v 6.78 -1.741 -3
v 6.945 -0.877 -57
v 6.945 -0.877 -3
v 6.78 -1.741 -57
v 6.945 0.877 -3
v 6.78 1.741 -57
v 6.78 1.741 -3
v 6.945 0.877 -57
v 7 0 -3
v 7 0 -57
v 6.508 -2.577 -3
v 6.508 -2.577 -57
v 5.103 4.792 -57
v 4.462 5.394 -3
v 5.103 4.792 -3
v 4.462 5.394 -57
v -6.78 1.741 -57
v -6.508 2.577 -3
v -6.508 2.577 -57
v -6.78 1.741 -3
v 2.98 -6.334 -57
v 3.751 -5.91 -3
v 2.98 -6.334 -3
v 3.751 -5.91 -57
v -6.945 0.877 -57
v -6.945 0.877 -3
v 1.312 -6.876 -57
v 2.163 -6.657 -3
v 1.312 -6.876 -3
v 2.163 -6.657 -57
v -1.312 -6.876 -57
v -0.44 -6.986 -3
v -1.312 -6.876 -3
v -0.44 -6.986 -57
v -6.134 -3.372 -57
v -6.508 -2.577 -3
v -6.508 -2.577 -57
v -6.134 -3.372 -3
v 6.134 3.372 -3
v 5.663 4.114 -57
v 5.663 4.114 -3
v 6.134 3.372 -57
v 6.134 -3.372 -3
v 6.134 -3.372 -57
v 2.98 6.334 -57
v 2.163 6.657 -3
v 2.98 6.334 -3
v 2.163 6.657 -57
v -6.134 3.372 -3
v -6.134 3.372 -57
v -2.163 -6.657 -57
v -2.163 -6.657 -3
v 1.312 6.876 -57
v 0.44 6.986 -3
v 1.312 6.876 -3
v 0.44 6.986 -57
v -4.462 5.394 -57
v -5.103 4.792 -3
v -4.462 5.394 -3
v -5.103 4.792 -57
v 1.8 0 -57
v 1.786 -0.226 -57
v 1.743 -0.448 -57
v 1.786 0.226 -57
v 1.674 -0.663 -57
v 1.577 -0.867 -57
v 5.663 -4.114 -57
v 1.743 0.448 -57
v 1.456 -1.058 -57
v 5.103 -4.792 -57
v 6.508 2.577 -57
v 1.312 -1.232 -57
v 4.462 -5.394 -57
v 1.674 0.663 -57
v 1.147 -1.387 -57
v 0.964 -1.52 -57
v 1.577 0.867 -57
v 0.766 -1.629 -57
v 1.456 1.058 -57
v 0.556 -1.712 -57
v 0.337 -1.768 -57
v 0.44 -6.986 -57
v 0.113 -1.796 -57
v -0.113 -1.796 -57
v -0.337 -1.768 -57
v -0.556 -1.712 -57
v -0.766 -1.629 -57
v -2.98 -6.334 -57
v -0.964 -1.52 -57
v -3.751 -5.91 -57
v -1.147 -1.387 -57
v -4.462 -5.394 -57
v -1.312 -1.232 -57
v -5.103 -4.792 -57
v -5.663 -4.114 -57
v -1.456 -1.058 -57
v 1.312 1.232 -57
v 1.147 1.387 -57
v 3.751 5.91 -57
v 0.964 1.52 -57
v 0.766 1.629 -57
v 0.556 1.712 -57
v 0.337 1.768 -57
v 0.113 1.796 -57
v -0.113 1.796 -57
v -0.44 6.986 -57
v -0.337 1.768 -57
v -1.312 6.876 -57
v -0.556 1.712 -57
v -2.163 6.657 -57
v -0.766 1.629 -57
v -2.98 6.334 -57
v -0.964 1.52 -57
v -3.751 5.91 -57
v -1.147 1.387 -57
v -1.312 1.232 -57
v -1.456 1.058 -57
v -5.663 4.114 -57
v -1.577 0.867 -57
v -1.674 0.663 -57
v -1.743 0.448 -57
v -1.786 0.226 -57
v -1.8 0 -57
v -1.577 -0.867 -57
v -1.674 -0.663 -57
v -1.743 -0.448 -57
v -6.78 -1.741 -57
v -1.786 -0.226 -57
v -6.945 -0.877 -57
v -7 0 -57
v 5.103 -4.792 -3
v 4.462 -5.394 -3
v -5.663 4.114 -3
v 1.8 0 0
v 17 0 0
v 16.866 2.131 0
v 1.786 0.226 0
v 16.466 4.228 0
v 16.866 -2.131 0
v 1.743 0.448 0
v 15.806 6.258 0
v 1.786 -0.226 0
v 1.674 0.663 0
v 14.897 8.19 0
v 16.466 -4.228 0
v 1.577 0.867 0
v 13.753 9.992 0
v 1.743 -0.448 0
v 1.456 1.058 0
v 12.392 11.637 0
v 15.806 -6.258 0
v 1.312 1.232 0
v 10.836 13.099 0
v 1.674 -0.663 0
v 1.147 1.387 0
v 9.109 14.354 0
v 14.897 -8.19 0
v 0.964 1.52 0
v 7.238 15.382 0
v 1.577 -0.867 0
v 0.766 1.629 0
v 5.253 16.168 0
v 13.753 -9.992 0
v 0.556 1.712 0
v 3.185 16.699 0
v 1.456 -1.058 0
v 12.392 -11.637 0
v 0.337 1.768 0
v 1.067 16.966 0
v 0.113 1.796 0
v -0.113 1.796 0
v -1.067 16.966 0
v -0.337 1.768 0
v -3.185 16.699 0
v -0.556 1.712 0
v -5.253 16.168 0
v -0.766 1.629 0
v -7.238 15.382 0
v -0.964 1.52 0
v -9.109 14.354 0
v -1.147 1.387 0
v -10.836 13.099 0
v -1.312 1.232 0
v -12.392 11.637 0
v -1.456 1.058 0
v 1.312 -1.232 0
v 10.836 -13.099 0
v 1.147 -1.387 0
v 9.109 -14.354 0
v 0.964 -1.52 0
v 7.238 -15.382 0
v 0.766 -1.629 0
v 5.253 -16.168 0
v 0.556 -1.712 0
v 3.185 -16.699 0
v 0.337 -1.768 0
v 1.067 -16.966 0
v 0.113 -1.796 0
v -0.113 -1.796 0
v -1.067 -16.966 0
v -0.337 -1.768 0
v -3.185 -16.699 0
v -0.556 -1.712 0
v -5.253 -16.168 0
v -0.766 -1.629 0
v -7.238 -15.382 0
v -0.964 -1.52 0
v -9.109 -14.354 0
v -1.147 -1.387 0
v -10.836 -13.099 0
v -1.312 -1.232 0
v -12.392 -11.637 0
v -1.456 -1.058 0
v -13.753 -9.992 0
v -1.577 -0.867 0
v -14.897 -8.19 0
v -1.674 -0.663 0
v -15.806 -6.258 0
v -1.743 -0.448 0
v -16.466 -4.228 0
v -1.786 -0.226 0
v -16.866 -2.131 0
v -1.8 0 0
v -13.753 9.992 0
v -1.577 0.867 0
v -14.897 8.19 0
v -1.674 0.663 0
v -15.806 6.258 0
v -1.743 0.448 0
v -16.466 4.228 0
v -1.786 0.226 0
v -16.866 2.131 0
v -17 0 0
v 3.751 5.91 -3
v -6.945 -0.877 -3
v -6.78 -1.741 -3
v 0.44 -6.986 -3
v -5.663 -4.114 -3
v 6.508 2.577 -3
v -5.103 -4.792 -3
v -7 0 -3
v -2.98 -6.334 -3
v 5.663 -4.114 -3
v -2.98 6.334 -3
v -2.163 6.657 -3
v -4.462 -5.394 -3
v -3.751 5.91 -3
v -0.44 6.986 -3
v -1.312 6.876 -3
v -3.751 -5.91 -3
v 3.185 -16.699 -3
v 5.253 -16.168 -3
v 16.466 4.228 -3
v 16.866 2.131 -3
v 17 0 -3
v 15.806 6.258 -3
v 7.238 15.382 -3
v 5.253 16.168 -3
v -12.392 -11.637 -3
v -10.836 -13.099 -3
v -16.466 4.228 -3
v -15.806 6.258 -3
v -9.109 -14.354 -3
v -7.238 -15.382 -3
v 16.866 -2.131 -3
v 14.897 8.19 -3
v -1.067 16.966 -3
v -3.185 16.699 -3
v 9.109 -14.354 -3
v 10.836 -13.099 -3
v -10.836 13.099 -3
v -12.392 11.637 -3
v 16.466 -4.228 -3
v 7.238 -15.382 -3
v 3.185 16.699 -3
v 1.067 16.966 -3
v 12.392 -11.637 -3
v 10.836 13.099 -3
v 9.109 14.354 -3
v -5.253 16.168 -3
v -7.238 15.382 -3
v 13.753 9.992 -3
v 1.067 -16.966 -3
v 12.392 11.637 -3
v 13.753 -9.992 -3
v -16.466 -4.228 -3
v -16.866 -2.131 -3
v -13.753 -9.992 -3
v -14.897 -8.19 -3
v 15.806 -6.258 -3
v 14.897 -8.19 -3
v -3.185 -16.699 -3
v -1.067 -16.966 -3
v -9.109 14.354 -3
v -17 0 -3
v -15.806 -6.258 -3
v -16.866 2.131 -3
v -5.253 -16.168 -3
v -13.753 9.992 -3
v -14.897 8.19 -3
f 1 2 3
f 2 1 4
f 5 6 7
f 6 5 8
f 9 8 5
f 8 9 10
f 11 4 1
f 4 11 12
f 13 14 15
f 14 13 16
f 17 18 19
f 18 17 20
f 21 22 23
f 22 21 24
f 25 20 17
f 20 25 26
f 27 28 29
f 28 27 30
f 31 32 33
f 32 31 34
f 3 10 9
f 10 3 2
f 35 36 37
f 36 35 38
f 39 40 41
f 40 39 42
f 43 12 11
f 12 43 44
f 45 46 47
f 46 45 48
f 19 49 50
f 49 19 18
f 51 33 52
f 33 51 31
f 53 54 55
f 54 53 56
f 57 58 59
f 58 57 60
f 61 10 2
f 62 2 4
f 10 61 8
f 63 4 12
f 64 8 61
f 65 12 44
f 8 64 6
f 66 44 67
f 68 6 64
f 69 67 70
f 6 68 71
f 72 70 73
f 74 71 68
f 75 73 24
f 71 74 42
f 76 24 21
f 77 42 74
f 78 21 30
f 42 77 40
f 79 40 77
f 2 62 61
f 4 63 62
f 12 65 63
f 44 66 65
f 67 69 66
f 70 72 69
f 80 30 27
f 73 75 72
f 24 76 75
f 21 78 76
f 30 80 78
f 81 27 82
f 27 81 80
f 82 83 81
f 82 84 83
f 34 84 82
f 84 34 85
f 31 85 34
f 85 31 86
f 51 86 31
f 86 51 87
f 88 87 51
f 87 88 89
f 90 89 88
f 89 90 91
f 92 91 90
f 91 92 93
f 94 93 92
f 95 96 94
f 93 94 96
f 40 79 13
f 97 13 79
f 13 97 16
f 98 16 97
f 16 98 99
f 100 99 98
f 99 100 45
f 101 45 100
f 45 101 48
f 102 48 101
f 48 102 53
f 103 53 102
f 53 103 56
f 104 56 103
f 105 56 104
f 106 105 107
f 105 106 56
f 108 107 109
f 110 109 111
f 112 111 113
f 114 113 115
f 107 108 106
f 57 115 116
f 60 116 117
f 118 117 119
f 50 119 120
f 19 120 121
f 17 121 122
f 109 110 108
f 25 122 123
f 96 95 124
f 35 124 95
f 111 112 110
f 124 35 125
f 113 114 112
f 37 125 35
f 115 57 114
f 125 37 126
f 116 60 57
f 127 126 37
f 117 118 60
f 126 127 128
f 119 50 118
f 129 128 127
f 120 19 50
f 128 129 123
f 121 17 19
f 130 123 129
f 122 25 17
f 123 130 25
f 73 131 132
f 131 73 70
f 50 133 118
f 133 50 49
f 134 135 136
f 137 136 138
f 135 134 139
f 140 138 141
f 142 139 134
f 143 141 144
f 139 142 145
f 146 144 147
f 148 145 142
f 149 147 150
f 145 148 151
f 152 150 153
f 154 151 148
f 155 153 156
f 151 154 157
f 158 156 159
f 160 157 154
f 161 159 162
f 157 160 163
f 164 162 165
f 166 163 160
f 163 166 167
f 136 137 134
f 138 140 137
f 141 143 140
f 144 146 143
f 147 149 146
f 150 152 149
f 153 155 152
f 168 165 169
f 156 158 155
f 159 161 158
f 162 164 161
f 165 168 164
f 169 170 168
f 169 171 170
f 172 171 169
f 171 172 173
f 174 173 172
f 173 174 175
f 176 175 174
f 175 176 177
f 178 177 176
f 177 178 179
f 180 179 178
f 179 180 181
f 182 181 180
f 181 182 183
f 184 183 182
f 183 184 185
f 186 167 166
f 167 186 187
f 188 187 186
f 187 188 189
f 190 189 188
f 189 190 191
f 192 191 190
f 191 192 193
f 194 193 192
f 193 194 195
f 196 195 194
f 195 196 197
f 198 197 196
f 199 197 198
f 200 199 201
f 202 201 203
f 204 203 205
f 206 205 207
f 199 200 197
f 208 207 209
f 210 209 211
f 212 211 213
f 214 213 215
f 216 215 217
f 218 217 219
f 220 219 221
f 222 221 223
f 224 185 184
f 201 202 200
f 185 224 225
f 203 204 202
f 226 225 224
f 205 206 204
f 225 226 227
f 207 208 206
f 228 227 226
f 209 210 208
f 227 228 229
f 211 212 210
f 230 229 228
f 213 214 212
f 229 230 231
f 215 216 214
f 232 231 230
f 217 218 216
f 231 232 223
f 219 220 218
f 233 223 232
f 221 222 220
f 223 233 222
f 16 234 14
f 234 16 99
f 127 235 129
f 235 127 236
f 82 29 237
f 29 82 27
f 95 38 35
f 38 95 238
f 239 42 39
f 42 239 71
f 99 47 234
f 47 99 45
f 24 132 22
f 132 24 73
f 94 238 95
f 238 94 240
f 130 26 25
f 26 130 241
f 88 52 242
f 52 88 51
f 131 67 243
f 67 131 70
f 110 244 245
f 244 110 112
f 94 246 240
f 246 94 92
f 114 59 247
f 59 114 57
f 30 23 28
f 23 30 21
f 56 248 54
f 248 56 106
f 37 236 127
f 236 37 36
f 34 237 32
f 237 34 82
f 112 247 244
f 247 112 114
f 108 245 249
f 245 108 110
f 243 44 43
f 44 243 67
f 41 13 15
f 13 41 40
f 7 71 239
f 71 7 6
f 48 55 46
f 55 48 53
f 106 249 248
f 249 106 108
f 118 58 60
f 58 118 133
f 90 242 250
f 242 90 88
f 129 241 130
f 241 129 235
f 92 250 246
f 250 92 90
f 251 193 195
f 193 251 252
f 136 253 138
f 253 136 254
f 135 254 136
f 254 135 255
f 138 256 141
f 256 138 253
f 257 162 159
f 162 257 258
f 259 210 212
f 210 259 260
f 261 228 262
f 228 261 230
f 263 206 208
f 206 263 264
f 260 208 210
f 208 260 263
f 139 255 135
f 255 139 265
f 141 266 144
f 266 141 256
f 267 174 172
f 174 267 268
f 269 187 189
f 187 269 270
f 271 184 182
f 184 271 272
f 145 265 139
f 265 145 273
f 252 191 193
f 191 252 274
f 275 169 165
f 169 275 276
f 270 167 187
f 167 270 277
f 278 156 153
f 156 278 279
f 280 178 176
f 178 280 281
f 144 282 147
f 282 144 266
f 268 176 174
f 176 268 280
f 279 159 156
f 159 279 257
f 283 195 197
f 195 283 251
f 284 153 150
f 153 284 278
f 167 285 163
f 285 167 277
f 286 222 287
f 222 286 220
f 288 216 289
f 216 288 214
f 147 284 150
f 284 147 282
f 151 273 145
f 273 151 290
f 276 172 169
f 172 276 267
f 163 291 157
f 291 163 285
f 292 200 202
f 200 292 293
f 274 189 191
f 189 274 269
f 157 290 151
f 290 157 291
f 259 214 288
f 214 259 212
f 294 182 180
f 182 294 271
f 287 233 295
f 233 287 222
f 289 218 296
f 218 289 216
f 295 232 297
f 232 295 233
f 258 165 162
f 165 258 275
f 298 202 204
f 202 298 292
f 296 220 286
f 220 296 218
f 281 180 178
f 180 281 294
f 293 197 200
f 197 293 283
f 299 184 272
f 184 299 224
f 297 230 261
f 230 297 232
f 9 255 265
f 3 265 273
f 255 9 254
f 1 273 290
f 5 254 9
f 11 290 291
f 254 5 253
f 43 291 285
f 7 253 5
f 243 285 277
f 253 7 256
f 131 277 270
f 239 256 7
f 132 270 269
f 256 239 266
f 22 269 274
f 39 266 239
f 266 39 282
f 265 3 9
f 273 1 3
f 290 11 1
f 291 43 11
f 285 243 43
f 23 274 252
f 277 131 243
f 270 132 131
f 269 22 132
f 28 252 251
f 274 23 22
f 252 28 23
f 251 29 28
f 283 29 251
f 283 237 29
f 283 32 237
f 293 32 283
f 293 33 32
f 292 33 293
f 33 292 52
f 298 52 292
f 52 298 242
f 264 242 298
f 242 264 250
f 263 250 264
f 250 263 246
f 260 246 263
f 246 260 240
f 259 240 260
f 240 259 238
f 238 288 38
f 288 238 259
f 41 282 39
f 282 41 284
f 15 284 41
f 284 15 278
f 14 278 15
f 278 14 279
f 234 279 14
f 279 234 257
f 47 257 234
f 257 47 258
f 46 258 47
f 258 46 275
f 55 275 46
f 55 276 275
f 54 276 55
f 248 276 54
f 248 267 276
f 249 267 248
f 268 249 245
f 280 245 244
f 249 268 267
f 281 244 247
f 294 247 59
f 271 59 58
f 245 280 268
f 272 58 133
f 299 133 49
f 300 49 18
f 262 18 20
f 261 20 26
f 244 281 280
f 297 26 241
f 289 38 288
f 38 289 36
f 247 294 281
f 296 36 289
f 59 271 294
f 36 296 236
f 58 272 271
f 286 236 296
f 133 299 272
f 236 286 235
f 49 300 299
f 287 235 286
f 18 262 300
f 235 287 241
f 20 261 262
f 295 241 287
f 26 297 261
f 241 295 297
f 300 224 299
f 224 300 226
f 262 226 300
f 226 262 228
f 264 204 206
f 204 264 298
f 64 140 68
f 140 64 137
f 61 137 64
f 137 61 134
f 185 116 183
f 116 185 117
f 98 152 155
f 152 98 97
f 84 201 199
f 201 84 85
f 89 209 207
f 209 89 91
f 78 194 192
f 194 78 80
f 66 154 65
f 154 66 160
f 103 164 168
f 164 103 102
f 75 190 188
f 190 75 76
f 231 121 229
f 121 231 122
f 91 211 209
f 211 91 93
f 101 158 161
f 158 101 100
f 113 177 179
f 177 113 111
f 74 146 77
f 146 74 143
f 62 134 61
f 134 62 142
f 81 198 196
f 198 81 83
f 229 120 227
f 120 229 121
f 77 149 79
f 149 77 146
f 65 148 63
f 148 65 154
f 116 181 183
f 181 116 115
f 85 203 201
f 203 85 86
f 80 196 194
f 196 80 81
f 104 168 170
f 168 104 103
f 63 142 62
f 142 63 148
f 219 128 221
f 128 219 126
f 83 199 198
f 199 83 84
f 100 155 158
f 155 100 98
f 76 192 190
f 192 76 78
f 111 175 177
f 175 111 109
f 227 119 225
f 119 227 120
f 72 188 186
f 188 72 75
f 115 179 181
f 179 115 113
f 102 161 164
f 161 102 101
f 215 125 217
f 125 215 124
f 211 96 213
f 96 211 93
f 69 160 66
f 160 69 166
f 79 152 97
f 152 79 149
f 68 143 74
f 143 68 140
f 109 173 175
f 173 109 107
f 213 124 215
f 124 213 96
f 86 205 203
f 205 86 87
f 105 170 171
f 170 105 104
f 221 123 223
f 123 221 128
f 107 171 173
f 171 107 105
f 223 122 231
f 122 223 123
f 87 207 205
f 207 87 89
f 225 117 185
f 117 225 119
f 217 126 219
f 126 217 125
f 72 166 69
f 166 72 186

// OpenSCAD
$fn = 50;


difference() {
	union() {
		translate(v = [0, 0, -57.0000000000]) {
			cylinder(h = 57, r = 7.0000000000);
		}
		translate(v = [0, 0, -3.0000000000]) {
			cylinder(h = 3, r = 17.0000000000);
		}
	}
	union() {
		#translate(v = [0, 0, -57]) {
			cylinder(h = 57, r = 1.8000000000);
		}
	}
}
